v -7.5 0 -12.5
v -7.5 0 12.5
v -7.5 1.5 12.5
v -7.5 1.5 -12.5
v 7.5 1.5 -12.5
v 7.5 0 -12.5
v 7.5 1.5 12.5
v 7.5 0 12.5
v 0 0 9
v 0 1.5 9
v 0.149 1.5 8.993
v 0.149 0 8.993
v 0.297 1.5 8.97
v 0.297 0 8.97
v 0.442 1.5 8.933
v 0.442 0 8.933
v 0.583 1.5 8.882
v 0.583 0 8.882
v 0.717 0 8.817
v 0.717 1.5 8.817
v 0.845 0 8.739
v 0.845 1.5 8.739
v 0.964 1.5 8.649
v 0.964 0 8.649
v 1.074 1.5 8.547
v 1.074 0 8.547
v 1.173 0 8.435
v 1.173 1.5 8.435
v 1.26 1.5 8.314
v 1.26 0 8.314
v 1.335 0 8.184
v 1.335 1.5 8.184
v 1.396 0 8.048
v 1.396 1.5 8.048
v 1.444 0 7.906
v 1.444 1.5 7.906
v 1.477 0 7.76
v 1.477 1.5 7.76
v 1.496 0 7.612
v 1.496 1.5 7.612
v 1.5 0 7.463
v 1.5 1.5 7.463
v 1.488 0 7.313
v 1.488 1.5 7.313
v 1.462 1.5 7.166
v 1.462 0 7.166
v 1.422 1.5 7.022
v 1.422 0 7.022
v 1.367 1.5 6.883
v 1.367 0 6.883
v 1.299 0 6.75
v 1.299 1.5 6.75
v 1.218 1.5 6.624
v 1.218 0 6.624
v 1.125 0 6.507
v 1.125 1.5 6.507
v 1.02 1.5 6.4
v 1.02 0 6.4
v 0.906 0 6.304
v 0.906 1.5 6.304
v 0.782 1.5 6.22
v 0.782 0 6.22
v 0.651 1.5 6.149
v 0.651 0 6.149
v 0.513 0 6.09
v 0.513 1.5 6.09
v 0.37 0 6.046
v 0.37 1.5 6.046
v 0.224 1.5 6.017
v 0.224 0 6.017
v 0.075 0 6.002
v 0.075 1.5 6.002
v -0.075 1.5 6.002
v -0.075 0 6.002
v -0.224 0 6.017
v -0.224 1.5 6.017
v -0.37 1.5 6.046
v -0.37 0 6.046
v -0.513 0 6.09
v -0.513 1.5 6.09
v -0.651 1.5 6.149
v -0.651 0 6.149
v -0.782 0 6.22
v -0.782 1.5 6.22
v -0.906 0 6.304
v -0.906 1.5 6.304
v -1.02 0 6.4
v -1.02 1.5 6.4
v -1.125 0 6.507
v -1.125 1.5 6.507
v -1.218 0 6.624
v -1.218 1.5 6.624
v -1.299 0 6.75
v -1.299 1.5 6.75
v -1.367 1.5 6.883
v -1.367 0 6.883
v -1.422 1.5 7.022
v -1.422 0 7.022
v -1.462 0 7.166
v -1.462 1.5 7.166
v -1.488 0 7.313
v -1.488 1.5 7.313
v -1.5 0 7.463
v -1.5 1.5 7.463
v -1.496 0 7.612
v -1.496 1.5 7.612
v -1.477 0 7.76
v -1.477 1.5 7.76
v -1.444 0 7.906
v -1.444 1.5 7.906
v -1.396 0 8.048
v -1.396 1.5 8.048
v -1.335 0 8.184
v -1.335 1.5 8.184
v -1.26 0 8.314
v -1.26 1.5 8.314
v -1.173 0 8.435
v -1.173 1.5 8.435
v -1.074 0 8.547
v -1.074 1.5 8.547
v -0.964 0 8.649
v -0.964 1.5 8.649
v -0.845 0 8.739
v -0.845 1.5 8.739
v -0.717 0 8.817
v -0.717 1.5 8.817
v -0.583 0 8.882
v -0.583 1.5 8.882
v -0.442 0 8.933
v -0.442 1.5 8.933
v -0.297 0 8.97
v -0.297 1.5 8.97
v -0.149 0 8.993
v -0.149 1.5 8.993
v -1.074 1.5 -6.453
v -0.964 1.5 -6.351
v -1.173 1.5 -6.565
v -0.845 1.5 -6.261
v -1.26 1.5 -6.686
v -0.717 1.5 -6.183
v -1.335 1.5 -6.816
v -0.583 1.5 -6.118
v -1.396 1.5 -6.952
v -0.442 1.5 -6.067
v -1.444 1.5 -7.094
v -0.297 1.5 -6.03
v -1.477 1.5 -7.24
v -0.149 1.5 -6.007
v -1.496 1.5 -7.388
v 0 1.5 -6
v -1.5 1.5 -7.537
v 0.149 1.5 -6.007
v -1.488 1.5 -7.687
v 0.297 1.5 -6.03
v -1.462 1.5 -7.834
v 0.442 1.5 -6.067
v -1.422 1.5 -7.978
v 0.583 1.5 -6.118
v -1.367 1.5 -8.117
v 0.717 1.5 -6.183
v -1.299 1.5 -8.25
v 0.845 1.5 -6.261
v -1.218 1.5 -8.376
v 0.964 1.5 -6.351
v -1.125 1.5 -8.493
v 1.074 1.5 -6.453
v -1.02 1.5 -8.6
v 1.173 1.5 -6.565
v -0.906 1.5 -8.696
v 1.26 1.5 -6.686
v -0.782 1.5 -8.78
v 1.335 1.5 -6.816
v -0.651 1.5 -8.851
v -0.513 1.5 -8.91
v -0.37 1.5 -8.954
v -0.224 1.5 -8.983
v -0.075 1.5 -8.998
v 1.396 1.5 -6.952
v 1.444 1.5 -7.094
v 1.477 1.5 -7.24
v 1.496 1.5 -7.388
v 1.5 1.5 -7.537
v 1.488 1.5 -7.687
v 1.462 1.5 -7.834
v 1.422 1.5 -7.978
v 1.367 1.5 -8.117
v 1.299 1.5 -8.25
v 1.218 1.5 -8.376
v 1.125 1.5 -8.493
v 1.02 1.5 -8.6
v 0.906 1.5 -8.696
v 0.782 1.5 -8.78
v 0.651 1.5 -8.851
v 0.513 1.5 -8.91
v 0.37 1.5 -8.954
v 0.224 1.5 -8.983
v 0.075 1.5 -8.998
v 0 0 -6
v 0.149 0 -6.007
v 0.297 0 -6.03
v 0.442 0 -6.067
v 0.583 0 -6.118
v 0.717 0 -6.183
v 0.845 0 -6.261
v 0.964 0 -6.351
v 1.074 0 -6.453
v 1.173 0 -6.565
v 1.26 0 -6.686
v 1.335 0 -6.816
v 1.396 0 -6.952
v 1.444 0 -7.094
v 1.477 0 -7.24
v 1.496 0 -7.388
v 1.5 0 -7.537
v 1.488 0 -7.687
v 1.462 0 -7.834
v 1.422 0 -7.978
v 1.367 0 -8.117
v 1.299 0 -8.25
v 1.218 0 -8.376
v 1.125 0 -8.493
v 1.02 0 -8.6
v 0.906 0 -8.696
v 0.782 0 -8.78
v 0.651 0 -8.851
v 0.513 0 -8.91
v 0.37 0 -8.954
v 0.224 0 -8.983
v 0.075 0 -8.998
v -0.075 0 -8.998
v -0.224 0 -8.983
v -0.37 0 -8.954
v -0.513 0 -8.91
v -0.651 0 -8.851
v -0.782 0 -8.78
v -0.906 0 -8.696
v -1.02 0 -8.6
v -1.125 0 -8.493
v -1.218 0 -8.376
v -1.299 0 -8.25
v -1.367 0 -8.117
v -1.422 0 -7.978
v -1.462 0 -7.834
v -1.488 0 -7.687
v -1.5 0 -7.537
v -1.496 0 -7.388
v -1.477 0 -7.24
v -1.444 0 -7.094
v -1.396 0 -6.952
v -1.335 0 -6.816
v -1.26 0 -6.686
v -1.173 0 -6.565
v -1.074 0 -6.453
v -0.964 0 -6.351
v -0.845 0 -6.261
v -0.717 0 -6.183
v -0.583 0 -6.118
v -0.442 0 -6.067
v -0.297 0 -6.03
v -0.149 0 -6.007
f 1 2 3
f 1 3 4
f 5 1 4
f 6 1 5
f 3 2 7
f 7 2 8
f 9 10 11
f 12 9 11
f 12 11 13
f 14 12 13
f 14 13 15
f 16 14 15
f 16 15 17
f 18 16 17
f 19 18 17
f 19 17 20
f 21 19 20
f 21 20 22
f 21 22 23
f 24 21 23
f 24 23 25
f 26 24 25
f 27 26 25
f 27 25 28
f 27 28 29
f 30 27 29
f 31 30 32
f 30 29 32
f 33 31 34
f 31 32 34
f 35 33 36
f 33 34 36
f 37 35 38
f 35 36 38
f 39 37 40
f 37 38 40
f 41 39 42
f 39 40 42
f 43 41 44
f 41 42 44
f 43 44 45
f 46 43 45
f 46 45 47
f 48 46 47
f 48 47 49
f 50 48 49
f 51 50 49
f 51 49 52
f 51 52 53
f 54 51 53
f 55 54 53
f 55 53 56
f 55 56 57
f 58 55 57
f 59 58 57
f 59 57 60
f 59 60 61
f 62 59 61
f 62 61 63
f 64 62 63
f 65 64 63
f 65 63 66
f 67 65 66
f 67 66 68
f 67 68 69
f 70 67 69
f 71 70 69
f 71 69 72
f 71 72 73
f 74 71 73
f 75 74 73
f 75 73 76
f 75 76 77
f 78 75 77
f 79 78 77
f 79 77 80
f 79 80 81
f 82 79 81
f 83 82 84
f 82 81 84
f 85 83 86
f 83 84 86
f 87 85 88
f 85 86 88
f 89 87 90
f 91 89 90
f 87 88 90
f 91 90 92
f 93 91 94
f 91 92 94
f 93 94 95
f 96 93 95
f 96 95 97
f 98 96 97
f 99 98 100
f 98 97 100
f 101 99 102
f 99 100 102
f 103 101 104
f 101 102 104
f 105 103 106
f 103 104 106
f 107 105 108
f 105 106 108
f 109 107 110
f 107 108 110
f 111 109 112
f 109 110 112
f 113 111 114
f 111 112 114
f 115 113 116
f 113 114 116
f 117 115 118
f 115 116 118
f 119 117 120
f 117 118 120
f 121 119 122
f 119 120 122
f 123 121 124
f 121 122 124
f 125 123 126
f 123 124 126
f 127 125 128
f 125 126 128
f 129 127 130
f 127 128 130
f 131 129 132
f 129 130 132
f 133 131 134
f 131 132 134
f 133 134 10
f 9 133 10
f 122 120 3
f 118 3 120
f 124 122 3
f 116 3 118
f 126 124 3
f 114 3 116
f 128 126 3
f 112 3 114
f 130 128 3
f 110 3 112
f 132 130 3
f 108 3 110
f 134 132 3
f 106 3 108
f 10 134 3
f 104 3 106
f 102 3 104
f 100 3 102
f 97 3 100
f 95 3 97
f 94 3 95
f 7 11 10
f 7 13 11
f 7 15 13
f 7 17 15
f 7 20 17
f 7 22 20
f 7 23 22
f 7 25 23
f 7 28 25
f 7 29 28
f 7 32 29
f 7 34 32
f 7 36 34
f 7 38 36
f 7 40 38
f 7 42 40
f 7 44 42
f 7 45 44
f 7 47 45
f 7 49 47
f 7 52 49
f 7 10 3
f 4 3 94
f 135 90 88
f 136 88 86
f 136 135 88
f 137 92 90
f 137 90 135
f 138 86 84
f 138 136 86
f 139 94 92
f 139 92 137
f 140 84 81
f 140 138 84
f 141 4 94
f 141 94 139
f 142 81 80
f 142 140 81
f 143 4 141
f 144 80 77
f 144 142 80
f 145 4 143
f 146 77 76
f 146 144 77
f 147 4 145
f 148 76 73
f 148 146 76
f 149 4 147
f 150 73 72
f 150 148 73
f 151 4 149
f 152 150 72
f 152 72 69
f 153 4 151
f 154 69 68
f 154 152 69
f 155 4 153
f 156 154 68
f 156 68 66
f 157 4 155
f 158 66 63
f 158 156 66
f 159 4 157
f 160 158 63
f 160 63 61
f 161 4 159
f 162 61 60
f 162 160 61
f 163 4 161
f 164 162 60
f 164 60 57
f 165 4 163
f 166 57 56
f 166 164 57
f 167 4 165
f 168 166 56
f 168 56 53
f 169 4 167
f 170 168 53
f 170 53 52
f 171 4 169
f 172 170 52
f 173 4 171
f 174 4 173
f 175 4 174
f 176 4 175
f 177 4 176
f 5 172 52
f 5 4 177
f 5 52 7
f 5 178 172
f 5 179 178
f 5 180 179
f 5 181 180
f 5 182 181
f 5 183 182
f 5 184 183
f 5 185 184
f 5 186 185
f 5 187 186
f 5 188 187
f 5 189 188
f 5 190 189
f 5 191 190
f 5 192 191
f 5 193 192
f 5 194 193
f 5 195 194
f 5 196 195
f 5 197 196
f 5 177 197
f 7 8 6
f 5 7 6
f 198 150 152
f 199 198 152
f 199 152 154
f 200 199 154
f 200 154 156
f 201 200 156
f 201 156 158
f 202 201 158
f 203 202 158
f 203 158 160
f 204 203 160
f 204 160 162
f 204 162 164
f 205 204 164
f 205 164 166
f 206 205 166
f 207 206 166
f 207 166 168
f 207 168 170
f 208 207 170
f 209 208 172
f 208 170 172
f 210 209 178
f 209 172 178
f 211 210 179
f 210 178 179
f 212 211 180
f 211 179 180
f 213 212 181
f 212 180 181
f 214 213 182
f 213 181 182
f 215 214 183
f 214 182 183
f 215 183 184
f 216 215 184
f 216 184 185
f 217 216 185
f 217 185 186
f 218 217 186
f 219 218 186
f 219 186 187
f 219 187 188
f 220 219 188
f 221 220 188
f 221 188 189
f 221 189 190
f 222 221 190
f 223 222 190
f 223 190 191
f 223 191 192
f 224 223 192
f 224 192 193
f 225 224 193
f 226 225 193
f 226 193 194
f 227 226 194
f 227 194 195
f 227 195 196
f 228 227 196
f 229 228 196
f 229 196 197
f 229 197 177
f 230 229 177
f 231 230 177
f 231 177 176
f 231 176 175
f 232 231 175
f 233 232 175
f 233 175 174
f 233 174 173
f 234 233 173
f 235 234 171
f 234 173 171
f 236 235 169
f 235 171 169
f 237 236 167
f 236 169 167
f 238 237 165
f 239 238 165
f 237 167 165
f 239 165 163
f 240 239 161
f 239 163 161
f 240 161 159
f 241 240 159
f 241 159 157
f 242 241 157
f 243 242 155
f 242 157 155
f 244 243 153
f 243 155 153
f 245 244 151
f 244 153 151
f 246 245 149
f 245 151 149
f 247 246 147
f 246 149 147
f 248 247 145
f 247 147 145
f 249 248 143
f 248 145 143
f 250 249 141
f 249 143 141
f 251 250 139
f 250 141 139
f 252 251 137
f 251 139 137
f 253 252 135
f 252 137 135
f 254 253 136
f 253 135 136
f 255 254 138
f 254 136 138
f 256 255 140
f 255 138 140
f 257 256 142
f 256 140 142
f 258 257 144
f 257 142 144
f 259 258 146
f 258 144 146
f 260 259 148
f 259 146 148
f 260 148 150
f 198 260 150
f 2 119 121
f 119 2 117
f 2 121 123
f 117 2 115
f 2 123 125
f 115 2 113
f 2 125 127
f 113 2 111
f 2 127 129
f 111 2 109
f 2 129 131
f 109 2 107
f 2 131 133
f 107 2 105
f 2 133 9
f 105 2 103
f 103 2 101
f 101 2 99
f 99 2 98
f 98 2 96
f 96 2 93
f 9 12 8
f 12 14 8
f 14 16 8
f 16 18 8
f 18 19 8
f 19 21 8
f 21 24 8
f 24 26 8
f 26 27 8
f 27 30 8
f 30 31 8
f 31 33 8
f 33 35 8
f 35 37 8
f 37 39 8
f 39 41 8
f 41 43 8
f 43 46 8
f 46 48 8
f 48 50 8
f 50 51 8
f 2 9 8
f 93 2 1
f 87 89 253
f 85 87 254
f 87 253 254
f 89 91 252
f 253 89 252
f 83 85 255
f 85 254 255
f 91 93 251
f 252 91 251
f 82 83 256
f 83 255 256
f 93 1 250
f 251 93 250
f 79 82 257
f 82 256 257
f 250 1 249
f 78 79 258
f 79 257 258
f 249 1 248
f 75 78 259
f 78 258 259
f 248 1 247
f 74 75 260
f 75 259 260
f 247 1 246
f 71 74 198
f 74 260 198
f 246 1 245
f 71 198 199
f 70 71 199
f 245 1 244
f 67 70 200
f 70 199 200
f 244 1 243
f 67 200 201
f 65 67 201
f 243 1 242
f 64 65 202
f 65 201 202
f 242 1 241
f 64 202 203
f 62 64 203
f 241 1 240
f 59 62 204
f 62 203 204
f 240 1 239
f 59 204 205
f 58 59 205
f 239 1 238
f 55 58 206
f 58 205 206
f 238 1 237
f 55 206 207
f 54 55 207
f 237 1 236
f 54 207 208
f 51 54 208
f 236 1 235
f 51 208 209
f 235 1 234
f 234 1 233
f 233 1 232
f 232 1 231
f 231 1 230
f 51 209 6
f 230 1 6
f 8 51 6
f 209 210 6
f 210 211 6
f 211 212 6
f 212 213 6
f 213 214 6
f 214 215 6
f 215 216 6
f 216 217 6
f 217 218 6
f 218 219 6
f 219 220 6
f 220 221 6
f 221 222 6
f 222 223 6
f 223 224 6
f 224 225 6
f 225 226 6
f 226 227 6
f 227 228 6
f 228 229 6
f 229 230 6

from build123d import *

# Parameters (mm, degrees)
CROQUIS1_W              = 15
CROQUIS1_H              = 25
SALIENTE_EXTRUIR2_DEPTH = 2
CROQUIS2_R              = 1.5
CORTAR_EXTRUIR1_DEPTH   = 2
CROQUIS3_W              = 26.611189866
CROQUIS3_H              = 39.098747884
CORTAR_EXTRUIR2_DEPTH   = 0.5


with BuildPart() as part:
    # Croquis1 → Saliente-Extruir2 (new body)
    with BuildSketch(Plane(origin=(0, 0, 0), x_dir=(1, 0, 0), z_dir=(0, 1, 0))):
        Rectangle(CROQUIS1_W, CROQUIS1_H)
    extrude(amount=SALIENTE_EXTRUIR2_DEPTH)

    # Croquis2 → Cortar-Extruir1 (cut)
    with BuildSketch(Plane(origin=(0, 2, 0), x_dir=(1, 0, 0), z_dir=(0, 1, 0))):
        with Locations(Location((0, 7.5, 0), (0, 0, 270))):
            Circle(CROQUIS2_R)
        with Locations(Location((0, -7.5, 0), (0, 0, 270))):
            Circle(CROQUIS2_R)
    extrude(amount=-CORTAR_EXTRUIR1_DEPTH, mode=Mode.SUBTRACT)

    # Croquis3 → Cortar-Extruir2 (cut)
    with BuildSketch(Plane(origin=(0, 2, 0), x_dir=(1, 0, 0), z_dir=(0, 1, 0))):
        Rectangle(CROQUIS3_W, CROQUIS3_H)
    extrude(amount=-CORTAR_EXTRUIR2_DEPTH, mode=Mode.SUBTRACT)


solid = part.part
